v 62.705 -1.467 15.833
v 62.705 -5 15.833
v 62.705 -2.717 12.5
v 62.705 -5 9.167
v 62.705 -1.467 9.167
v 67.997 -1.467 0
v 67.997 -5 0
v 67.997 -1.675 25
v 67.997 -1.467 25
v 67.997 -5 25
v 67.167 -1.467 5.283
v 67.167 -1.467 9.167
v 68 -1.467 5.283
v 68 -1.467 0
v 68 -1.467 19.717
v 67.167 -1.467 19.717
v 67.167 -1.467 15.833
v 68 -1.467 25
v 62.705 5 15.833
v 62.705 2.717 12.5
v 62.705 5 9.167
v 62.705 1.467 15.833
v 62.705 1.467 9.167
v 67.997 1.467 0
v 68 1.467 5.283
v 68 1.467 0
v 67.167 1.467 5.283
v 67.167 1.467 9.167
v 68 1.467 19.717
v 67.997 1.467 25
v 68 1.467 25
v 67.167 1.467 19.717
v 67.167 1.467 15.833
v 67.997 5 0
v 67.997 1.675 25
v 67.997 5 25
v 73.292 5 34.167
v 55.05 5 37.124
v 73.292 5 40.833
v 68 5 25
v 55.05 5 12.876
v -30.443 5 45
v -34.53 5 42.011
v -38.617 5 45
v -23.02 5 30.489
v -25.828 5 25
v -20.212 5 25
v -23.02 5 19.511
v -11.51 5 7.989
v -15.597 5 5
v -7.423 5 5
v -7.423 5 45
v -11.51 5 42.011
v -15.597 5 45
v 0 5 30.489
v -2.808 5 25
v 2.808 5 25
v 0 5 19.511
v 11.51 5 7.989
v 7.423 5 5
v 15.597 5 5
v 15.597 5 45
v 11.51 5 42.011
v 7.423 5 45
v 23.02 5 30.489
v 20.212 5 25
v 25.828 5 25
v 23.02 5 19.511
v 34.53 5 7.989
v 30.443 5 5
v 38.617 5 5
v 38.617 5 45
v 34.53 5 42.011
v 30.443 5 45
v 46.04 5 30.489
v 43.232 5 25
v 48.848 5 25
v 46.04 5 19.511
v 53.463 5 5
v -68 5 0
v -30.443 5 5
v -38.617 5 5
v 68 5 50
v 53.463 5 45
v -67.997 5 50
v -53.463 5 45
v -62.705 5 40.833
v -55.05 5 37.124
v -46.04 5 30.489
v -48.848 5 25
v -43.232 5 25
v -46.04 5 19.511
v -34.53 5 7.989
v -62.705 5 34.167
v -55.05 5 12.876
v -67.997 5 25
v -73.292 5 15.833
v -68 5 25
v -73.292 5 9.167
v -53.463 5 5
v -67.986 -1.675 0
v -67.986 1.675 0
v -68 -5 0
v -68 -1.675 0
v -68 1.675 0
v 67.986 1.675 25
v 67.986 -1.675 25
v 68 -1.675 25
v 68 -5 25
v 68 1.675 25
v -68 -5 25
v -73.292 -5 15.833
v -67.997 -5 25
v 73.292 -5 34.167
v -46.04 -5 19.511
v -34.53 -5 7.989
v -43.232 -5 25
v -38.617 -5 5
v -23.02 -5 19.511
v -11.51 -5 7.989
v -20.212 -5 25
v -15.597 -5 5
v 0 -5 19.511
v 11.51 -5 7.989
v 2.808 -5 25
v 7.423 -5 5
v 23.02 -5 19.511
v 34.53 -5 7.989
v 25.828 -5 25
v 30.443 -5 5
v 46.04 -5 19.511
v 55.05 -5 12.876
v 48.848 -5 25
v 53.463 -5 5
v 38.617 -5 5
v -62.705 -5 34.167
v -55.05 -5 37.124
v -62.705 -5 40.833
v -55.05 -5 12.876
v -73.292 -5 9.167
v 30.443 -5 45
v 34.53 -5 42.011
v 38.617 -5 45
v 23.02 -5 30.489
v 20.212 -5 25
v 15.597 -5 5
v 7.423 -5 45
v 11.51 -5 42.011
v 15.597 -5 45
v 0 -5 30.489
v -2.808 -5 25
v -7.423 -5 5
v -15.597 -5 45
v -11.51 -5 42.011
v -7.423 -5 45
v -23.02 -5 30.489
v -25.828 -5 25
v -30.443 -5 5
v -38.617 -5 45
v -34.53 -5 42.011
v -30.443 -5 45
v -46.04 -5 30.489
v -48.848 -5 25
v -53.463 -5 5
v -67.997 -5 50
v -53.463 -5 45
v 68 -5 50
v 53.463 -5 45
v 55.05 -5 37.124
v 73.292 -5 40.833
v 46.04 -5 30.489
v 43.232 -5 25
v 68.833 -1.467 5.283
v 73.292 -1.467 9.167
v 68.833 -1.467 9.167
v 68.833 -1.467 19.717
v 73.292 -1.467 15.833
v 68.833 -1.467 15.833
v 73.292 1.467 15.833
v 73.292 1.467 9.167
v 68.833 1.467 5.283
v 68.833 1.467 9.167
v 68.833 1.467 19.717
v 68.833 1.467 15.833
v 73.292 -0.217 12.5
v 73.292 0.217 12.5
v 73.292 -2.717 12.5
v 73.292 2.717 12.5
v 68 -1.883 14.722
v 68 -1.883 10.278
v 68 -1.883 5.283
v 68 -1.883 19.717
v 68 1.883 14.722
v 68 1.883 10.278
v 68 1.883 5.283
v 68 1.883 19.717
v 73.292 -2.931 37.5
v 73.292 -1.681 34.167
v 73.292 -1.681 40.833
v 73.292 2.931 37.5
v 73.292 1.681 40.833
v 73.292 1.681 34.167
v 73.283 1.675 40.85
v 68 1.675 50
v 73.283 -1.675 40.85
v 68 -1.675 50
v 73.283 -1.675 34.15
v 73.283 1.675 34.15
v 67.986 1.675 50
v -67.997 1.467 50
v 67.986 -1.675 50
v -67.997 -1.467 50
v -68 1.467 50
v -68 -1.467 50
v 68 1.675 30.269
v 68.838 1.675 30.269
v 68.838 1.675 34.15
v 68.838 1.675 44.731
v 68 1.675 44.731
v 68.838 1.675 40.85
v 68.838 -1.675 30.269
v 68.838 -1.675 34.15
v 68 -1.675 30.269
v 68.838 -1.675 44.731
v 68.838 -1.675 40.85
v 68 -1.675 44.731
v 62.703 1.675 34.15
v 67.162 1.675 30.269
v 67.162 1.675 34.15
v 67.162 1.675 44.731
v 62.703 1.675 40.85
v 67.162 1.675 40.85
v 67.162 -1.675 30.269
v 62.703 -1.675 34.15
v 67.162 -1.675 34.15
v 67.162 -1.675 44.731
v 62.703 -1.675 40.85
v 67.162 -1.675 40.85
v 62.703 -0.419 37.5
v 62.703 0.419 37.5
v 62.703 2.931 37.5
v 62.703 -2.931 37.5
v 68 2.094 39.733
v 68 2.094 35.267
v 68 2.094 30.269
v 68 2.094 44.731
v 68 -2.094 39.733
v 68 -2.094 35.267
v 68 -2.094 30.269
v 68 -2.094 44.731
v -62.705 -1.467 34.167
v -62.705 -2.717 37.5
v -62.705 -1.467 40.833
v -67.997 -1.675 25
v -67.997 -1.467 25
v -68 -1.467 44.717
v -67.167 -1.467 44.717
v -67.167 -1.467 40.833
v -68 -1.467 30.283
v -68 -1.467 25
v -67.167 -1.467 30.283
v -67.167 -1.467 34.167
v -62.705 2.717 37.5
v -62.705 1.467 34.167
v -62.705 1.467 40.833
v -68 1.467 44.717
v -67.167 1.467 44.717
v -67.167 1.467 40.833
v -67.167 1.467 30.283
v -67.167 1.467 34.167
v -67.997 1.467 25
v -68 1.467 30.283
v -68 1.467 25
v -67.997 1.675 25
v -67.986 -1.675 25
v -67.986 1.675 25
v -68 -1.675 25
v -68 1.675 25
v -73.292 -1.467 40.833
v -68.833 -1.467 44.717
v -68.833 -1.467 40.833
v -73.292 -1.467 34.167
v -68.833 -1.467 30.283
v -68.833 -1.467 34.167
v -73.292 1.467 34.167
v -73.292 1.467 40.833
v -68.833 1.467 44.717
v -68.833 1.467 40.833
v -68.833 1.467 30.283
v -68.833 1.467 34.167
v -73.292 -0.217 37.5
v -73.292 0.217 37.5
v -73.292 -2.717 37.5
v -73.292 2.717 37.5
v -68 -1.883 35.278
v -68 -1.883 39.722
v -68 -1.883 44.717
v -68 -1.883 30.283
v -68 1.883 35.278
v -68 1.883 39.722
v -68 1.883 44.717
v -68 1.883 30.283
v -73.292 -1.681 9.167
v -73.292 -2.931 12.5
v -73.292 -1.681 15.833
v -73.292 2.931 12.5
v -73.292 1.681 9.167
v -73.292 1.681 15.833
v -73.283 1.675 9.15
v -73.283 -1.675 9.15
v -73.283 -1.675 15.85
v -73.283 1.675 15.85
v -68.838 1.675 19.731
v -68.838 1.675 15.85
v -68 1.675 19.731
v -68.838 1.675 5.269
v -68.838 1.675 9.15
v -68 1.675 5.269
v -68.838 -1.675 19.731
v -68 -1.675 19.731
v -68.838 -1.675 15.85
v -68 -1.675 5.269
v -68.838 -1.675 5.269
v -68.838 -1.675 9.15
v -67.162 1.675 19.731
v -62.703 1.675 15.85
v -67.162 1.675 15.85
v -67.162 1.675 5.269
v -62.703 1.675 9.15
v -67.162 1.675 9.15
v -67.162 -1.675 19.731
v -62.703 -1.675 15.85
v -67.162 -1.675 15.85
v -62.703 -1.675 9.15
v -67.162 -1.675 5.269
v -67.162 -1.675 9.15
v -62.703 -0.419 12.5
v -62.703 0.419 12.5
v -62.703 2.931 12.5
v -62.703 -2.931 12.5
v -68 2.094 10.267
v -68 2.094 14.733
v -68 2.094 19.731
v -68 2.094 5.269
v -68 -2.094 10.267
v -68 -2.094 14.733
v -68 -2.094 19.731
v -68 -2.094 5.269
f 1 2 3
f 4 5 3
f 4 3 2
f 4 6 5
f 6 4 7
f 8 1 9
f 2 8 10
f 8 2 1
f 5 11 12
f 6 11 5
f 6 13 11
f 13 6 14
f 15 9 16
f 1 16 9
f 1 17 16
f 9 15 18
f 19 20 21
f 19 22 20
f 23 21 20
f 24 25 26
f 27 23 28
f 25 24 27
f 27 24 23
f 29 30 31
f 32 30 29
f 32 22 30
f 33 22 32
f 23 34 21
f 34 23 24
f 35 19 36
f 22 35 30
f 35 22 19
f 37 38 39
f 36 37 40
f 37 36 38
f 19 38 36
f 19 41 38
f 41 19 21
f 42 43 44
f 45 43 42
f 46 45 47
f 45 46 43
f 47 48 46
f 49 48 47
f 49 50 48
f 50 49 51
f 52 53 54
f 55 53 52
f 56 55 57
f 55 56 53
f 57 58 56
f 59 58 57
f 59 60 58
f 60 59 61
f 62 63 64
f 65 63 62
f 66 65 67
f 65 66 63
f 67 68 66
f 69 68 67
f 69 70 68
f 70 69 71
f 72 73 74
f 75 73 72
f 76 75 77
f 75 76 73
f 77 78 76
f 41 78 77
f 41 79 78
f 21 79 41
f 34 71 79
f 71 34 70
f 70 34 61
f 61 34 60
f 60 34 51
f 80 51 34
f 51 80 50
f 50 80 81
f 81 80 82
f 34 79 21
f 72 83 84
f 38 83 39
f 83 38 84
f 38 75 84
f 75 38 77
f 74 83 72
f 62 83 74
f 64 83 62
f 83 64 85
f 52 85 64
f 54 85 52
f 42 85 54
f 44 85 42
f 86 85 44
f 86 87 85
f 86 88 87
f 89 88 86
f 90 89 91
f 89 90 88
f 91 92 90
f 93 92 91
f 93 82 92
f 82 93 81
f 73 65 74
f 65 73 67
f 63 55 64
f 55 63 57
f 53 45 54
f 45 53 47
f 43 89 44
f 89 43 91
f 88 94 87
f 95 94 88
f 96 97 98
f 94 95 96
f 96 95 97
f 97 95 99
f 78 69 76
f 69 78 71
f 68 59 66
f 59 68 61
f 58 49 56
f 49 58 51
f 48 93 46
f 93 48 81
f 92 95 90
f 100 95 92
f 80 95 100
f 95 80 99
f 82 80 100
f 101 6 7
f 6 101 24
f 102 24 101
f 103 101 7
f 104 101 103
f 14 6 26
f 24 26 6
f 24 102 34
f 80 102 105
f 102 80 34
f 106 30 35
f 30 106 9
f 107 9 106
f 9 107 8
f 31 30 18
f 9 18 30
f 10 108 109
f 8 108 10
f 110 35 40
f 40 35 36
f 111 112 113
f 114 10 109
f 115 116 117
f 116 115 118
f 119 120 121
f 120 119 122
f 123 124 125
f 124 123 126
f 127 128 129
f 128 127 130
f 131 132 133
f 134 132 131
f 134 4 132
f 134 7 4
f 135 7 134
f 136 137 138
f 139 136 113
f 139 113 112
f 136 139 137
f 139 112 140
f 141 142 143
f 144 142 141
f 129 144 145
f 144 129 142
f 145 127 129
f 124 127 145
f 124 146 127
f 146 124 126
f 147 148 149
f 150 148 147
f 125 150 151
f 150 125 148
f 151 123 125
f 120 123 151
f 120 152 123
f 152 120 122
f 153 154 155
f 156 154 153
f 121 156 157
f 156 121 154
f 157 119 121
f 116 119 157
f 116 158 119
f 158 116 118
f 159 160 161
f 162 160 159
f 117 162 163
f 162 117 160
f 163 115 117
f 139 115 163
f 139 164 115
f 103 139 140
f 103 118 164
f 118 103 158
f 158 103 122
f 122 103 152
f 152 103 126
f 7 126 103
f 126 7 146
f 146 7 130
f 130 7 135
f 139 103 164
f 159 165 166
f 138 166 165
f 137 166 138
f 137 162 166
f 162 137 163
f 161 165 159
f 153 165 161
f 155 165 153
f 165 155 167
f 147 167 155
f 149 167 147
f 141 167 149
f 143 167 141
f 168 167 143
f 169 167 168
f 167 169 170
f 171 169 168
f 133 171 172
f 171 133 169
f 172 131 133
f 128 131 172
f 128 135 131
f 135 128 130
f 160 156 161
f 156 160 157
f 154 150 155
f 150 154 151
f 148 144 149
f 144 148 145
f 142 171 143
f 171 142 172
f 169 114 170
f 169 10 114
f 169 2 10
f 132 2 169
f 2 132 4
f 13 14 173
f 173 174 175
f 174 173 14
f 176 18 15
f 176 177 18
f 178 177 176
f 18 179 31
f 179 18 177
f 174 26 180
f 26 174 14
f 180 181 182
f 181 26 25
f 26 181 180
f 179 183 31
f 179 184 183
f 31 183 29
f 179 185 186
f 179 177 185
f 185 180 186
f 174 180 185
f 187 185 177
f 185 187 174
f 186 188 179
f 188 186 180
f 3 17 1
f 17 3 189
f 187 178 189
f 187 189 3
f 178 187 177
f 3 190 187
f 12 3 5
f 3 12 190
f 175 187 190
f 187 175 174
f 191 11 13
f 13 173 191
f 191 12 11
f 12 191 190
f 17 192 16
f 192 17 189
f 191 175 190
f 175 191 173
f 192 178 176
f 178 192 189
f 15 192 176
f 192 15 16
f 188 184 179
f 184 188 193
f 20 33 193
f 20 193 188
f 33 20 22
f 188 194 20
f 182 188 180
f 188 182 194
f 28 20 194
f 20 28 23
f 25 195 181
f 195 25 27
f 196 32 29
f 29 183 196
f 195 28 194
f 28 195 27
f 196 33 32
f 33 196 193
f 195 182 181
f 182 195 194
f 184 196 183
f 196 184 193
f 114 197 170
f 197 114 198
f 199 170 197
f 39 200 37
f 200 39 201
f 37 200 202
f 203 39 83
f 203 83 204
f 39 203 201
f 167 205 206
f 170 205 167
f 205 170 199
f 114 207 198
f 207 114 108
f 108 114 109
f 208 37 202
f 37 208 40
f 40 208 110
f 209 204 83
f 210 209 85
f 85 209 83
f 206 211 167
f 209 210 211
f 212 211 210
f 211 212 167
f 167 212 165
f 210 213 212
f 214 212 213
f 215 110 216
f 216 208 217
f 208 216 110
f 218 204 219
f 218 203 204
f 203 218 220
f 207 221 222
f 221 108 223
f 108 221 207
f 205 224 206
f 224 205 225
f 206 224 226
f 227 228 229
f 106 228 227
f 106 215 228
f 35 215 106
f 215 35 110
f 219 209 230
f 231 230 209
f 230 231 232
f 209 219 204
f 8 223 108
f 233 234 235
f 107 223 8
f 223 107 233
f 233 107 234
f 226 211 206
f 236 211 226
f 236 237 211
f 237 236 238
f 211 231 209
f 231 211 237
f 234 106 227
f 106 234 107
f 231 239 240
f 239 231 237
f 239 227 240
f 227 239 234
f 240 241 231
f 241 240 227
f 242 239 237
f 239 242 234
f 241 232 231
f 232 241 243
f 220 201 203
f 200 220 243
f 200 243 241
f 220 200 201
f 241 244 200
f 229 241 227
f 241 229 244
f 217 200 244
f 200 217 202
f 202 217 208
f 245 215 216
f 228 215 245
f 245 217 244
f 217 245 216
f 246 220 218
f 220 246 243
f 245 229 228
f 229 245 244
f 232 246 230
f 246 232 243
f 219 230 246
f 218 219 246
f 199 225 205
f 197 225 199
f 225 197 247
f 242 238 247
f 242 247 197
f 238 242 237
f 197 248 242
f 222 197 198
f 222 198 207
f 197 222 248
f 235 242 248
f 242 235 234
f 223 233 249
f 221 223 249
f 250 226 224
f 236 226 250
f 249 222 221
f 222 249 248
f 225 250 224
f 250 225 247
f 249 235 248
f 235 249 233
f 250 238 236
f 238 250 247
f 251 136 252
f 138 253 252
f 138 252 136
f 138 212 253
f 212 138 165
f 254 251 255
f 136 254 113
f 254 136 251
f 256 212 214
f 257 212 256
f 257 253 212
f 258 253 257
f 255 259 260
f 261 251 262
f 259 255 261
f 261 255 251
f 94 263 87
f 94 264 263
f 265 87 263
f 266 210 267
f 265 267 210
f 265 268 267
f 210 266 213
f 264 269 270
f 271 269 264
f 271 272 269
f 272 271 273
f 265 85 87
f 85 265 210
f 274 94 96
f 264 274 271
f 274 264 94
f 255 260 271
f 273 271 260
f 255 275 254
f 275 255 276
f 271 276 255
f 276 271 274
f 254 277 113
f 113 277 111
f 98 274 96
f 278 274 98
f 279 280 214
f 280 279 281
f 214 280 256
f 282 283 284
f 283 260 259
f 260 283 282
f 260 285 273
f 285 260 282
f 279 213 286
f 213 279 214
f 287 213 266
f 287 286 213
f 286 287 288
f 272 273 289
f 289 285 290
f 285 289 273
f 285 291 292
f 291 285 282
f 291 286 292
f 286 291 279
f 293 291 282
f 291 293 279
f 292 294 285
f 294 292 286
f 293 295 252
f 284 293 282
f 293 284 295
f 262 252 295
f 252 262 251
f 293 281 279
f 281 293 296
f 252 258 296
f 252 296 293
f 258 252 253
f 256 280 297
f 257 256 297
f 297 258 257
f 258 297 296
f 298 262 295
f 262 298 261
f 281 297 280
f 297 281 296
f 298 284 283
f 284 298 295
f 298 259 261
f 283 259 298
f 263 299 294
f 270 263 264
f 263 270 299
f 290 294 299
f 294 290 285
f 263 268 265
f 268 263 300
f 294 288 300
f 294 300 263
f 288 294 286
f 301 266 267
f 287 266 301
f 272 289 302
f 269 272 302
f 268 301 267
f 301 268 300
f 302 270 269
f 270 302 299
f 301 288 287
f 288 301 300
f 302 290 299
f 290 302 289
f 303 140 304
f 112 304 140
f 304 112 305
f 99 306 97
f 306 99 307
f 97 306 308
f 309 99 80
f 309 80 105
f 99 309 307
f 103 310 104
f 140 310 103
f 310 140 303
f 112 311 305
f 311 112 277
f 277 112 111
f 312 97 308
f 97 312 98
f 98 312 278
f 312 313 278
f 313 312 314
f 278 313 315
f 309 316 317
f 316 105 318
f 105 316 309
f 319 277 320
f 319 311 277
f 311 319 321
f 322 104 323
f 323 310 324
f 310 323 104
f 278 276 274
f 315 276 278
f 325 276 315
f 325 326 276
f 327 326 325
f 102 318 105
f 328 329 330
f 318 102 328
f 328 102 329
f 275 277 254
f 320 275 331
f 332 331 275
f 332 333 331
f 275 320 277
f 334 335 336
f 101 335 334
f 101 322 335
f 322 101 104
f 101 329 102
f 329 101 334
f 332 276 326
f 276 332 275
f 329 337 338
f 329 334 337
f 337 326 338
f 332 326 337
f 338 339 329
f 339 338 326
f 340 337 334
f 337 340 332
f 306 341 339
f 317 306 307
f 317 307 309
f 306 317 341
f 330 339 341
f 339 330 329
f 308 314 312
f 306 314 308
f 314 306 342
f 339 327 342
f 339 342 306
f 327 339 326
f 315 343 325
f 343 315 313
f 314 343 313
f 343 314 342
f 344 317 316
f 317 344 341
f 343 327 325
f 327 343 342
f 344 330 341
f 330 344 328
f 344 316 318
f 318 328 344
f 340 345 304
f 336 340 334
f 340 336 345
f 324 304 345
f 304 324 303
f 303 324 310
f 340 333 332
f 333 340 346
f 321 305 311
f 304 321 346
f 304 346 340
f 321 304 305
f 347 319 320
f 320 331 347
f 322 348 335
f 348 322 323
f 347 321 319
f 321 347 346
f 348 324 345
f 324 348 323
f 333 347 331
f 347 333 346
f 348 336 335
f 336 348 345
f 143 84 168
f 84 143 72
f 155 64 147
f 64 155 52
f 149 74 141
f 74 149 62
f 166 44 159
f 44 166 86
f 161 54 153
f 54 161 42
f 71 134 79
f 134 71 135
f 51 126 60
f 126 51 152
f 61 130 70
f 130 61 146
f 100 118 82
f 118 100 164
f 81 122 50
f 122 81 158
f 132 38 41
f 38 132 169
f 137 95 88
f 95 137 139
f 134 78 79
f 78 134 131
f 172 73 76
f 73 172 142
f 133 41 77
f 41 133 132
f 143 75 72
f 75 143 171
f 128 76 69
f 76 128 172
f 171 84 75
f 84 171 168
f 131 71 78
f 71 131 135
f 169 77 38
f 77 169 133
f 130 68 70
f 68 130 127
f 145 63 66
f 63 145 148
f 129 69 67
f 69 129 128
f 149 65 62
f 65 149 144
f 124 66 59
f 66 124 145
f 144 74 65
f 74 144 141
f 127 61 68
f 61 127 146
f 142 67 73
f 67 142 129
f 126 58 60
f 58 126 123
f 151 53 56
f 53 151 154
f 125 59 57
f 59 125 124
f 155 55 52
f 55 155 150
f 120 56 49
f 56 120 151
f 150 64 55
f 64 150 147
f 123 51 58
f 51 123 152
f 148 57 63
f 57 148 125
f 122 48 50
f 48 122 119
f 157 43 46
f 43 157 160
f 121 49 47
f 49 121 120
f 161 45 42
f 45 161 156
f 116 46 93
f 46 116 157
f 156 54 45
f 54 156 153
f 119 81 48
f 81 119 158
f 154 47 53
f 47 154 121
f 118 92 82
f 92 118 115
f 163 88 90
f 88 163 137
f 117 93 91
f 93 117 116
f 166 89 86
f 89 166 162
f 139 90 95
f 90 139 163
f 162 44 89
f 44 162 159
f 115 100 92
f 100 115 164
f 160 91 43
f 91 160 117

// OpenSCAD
include <config.scad>
use <GDMUtils.scad>
use <joiners.scad>



$fa = 2;
$fs = 2;

module bridge_brace(explode=0, arrows=false)
{
	l = rail_length;
	union() {
		right(l/2) zrot(-90) yrot(90) joiner(h=rail_height, w=joiner_width, l=10, a=joiner_angle);
		left(l/2) zrot(90) yrot(90) joiner(h=rail_height, w=joiner_width, l=10, a=joiner_angle);
		xrot(90) zrot(90) sparse_strut(h=rail_height, l=l-2*8+0.1, thick=joiner_width, strut=5);
	}
}



module bridge_brace_parts() { // make me
	up(rail_height/2) xrot(90) bridge_brace();
}


bridge_brace_parts();


// vim: noexpandtab tabstop=4 shiftwidth=4 softtabstop=4 nowrap
